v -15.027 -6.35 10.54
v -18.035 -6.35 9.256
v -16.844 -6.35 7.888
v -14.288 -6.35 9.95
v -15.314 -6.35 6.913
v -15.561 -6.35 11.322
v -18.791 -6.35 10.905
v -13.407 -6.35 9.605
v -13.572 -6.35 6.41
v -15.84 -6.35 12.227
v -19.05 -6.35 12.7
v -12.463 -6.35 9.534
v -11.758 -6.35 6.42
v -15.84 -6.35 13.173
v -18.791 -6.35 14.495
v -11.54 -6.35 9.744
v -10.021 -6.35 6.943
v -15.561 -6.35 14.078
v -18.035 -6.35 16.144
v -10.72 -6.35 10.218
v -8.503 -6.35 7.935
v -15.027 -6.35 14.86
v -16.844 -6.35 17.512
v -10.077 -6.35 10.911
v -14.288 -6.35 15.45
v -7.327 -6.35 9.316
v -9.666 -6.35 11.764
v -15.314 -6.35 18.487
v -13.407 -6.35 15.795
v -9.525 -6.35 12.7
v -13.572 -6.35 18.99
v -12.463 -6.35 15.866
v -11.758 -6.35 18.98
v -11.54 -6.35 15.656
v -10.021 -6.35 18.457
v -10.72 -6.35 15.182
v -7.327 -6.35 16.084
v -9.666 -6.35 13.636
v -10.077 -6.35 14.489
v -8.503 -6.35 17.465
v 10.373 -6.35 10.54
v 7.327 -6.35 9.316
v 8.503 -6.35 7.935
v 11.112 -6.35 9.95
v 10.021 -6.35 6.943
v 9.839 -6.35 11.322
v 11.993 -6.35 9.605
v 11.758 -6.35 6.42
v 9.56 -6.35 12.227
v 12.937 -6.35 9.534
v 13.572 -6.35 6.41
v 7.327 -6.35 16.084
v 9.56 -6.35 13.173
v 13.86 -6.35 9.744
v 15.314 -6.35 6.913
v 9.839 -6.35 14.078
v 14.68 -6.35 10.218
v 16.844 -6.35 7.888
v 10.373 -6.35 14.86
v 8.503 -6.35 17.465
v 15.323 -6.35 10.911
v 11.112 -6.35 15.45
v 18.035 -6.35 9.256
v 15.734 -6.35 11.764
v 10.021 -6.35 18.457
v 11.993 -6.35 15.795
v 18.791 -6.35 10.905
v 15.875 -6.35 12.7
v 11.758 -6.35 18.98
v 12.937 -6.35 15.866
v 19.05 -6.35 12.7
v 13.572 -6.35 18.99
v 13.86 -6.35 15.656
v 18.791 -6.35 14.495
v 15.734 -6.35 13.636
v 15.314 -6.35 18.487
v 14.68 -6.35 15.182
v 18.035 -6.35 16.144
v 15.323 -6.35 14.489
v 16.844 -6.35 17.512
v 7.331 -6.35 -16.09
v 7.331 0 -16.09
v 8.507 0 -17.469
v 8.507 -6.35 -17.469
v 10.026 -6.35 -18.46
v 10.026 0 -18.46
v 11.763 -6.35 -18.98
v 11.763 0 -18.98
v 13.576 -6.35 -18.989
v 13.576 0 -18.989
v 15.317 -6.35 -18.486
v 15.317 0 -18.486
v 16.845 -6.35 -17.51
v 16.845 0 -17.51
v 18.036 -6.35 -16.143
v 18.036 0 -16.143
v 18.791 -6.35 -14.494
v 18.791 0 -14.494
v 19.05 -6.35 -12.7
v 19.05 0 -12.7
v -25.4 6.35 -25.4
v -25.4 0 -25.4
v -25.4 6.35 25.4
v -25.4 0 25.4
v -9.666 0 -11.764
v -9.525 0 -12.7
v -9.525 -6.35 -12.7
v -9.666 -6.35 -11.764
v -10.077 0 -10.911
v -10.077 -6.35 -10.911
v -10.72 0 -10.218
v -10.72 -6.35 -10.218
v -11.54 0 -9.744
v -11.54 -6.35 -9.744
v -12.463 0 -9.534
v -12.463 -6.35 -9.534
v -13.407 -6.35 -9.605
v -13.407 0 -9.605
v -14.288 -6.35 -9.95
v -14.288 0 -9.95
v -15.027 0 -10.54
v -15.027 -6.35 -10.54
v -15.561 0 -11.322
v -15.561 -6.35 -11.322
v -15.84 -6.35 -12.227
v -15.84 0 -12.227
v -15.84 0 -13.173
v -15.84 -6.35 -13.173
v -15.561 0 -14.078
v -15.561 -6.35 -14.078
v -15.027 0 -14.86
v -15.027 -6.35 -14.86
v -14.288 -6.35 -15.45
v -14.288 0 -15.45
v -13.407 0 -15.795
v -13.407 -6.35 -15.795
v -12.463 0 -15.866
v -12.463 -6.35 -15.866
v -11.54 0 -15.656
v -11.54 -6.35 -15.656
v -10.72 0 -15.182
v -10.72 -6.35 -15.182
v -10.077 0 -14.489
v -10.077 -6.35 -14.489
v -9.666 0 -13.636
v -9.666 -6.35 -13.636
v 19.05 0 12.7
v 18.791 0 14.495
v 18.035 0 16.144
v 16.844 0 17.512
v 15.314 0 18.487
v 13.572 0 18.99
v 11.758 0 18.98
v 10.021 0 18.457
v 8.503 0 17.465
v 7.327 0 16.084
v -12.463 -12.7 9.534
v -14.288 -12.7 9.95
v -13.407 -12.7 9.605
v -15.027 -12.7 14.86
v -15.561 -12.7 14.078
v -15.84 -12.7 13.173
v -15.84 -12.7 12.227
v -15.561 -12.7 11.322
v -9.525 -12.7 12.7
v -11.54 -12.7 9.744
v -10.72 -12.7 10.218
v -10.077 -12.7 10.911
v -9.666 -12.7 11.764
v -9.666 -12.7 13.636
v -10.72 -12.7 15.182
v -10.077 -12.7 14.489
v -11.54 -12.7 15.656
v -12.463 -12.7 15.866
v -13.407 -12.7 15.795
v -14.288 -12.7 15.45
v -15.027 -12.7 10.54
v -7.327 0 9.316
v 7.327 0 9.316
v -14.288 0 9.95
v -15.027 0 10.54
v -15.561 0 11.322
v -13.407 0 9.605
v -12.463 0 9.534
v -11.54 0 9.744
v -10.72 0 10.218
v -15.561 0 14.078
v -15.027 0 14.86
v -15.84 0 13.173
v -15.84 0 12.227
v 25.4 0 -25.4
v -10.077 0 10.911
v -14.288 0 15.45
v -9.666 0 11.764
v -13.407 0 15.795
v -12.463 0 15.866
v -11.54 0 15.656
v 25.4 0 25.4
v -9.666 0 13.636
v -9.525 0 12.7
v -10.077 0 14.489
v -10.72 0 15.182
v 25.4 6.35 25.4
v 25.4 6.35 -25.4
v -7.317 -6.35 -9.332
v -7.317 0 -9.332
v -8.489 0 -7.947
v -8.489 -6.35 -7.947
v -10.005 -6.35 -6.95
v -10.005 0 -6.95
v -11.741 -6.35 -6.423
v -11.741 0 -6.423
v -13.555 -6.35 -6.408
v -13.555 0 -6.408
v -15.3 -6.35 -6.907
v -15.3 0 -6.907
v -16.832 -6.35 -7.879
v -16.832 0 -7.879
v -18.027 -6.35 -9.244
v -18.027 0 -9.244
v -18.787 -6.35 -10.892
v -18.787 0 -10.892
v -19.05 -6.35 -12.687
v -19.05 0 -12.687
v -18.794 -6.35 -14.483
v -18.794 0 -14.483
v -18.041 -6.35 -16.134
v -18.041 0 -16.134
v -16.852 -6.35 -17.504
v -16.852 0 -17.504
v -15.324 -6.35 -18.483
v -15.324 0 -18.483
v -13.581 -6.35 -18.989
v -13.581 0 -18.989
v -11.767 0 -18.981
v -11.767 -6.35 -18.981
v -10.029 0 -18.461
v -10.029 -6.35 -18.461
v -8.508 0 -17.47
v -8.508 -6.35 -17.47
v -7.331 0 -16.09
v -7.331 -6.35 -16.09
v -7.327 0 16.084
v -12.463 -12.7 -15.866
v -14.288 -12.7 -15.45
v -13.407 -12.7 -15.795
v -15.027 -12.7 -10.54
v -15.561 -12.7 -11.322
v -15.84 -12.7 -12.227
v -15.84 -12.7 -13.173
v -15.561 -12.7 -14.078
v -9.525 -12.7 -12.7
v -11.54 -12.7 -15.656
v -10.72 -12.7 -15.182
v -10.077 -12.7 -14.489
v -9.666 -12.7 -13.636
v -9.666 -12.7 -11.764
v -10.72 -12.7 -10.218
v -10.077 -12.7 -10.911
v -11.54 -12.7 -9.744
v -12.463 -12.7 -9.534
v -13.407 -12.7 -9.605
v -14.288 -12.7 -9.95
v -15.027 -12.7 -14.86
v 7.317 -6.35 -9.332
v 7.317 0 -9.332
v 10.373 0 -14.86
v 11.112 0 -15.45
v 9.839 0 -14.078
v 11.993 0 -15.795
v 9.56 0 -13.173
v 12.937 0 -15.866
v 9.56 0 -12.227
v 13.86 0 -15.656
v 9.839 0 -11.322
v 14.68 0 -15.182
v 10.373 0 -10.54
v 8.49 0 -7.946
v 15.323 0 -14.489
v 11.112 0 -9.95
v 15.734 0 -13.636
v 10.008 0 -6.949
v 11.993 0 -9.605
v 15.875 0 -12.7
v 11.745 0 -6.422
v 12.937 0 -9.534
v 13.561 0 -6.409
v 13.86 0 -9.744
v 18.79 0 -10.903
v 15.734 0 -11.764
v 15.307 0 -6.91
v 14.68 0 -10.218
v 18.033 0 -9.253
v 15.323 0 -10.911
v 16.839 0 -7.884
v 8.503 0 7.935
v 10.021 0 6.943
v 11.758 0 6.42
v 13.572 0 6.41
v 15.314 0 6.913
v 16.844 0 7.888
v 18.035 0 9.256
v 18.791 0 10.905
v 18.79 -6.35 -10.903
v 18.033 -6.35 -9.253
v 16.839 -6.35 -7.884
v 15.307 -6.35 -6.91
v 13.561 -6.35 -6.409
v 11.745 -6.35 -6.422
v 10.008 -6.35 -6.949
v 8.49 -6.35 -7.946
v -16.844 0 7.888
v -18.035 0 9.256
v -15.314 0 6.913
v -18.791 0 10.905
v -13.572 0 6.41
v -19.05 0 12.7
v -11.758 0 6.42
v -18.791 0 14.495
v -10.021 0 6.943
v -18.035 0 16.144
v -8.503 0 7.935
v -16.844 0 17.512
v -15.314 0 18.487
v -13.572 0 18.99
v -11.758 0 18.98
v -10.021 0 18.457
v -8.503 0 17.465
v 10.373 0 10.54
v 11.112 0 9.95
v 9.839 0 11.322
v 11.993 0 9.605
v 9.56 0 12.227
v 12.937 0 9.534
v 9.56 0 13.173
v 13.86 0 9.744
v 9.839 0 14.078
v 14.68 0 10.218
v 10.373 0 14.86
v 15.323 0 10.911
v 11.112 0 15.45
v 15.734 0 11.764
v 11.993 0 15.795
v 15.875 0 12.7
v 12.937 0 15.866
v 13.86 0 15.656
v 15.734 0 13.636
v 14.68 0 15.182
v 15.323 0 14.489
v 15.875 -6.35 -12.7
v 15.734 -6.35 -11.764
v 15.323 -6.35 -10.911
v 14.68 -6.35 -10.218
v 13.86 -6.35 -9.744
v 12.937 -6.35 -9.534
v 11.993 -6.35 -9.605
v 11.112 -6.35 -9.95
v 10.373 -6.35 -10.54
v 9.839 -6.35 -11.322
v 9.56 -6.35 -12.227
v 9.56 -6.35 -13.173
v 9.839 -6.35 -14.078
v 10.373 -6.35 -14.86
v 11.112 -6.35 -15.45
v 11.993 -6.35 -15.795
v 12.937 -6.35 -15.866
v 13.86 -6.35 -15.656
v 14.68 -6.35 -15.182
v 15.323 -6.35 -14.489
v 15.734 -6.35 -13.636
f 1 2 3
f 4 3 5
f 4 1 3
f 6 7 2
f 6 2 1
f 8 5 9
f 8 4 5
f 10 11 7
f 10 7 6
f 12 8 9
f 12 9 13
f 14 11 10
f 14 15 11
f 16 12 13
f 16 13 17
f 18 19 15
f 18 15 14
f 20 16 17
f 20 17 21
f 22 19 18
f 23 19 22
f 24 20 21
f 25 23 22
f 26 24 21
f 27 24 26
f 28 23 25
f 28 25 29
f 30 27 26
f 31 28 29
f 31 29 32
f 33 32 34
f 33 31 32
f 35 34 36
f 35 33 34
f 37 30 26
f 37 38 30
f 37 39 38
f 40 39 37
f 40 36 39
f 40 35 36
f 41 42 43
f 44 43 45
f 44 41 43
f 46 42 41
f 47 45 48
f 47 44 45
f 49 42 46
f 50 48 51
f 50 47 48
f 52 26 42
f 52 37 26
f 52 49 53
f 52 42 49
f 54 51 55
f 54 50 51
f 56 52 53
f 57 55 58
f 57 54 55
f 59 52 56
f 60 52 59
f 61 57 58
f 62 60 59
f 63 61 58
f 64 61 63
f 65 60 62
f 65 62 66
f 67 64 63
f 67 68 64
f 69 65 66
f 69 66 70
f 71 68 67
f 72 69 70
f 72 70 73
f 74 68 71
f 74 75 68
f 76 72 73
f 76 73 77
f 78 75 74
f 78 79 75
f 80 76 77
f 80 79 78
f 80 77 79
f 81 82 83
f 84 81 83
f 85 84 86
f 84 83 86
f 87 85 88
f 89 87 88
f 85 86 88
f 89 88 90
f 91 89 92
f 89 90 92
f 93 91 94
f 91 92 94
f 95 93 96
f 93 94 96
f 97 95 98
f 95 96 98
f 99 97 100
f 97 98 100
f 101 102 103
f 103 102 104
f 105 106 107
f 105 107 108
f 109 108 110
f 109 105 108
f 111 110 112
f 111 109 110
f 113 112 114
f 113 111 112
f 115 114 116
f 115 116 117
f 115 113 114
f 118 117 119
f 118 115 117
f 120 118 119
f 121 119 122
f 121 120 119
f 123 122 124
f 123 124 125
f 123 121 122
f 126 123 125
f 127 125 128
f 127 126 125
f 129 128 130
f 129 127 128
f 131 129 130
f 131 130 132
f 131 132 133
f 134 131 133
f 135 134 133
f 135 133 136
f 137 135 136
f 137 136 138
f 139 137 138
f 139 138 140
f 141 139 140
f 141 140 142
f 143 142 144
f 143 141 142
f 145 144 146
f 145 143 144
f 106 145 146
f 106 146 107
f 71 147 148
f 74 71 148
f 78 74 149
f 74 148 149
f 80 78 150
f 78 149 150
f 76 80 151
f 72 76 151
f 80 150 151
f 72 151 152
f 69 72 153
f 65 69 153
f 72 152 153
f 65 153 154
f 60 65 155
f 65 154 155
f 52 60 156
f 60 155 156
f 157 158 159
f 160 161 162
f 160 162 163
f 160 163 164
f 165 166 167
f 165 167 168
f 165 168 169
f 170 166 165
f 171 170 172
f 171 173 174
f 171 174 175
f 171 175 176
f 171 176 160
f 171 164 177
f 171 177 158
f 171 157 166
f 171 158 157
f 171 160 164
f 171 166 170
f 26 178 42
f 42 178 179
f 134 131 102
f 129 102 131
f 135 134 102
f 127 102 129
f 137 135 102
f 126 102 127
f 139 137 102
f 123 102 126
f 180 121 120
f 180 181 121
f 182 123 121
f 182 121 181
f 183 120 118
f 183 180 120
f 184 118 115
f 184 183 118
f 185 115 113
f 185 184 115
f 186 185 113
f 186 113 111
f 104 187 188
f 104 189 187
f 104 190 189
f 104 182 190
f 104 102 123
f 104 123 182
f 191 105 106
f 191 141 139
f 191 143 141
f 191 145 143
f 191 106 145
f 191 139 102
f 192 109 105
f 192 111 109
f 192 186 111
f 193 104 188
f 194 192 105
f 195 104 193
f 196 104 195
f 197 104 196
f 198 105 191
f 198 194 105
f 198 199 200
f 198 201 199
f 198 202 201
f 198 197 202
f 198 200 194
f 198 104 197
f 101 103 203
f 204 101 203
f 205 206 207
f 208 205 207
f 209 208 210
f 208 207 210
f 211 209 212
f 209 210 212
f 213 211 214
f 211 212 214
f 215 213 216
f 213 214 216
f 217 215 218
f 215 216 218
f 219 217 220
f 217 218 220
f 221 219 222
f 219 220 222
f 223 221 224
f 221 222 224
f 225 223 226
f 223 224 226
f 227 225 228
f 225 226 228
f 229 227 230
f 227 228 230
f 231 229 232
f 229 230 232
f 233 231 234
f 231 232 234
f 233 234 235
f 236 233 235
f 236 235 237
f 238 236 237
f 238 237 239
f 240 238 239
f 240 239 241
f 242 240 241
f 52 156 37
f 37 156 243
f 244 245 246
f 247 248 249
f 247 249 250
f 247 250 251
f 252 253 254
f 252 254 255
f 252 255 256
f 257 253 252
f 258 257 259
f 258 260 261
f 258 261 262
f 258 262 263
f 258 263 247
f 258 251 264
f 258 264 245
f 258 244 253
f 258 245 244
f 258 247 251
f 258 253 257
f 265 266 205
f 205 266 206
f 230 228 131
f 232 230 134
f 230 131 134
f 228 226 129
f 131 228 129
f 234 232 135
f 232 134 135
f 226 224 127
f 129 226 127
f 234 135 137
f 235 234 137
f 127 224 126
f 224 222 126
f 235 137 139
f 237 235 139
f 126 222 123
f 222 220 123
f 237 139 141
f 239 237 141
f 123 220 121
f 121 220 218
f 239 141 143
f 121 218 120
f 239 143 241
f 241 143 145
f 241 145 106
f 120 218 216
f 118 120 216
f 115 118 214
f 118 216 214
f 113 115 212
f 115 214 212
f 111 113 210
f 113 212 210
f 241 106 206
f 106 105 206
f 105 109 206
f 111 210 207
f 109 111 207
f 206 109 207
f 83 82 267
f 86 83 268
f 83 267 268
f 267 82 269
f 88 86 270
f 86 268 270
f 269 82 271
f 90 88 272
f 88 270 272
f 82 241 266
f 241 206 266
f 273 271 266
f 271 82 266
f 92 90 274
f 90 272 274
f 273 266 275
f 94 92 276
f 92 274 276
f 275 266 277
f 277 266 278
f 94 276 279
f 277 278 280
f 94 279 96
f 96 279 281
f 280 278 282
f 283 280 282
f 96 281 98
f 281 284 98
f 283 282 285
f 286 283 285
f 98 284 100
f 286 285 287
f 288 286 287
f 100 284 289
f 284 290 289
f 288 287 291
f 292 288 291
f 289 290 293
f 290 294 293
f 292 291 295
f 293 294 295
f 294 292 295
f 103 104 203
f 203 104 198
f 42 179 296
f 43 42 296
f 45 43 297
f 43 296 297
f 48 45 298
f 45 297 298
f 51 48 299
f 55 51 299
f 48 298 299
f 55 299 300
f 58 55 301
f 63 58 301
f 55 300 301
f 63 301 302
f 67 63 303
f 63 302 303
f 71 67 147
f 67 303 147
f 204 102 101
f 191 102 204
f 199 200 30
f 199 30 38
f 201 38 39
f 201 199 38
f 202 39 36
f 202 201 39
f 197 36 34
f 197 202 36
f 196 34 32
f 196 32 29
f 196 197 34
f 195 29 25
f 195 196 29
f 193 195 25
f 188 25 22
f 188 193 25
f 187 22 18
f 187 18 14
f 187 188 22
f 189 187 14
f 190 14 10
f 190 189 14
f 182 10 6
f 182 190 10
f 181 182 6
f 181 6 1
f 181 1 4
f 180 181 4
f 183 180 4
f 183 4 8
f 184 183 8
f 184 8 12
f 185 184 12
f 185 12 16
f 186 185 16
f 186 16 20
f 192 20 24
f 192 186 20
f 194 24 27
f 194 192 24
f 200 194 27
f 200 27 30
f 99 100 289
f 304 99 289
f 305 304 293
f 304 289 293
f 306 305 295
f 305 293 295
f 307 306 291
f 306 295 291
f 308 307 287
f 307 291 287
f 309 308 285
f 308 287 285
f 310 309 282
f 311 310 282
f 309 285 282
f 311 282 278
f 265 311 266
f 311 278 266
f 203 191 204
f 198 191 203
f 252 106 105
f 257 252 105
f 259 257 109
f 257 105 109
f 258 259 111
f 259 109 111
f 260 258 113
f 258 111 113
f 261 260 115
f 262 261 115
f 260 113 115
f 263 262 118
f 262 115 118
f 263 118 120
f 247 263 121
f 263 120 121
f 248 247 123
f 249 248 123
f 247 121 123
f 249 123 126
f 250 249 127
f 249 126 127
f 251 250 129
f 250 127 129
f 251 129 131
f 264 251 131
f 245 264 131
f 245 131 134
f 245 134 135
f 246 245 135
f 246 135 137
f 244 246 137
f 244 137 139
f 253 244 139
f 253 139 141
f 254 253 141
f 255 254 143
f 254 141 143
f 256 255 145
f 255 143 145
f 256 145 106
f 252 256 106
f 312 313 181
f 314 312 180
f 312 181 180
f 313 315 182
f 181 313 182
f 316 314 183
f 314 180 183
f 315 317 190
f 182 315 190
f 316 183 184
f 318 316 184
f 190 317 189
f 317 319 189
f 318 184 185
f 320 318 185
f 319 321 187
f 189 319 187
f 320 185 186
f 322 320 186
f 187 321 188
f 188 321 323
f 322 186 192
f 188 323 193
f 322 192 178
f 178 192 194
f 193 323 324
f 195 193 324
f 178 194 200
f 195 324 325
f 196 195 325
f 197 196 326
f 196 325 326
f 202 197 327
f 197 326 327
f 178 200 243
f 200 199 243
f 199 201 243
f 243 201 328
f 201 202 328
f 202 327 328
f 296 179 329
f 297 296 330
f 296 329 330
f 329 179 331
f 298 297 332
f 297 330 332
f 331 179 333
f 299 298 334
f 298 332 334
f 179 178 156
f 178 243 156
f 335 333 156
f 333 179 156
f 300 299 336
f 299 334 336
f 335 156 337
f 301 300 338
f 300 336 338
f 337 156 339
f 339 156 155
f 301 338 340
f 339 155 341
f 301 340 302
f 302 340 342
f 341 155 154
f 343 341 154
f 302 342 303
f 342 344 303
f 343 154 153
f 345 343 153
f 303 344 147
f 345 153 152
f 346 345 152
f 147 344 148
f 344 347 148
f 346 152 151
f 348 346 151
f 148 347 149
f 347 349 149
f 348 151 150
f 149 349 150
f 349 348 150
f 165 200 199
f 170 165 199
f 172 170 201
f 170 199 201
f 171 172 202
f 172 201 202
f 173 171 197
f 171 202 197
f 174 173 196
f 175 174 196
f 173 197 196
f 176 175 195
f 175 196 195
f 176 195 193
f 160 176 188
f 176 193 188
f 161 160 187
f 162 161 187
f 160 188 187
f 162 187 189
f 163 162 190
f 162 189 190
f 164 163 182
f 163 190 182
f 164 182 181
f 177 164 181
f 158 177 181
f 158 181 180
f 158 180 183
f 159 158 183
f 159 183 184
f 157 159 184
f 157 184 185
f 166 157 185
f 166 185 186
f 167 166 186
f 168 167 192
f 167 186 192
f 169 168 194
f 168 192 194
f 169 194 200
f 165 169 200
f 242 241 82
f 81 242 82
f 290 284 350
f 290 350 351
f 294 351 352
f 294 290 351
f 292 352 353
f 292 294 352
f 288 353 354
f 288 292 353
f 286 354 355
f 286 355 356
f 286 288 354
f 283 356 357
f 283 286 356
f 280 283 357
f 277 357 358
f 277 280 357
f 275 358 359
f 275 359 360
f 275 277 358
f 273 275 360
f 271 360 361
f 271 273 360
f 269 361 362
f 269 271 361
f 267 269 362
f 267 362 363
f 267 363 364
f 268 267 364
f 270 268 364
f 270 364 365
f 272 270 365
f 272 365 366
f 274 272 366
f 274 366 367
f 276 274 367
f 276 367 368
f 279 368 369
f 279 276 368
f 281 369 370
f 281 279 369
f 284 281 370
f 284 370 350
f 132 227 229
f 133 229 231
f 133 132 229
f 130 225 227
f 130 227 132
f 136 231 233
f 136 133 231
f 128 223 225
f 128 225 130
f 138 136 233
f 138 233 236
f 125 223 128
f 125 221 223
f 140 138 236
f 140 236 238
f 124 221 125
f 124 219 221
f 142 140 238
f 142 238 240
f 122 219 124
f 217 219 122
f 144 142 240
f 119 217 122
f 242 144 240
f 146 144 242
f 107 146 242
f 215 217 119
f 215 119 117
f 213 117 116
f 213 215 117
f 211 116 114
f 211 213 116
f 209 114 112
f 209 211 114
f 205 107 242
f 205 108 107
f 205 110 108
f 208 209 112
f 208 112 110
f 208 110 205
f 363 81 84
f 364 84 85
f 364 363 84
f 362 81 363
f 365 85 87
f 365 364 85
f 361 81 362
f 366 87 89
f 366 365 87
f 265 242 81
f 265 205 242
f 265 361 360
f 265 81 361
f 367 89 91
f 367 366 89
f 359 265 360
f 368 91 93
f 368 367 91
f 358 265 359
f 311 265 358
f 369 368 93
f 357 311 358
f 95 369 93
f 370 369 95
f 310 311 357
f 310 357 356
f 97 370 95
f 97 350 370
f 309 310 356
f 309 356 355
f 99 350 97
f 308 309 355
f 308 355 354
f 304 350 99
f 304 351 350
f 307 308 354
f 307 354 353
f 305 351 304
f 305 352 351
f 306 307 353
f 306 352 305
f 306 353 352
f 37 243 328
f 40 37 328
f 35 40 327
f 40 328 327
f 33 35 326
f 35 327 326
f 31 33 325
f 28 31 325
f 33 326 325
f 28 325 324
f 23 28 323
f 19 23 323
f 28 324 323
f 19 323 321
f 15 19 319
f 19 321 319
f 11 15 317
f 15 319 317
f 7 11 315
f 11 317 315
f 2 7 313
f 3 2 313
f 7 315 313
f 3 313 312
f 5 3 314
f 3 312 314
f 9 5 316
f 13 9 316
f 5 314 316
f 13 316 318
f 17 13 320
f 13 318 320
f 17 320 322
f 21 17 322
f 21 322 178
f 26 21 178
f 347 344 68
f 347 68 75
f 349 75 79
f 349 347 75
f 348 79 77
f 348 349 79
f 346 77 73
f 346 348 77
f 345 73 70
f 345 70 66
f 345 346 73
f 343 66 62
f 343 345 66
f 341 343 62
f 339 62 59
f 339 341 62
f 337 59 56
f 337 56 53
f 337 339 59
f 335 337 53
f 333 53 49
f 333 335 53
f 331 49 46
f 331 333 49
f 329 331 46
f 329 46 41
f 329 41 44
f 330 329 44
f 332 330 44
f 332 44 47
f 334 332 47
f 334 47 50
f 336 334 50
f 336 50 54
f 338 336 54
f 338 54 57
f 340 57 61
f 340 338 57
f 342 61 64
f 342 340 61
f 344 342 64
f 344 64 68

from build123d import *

# Parameters (mm, degrees)
F0_W     = 50.8
F0_H     = 50.8
F0_R     = 3.175
F1_DEPTH = 6.35
F2_DEPTH = 12.7
F3_R     = 3.175
F4_DEPTH = 6.35


with BuildPart() as f1:
    # F0 (on Front) → F1 (new body)
    with BuildSketch(Plane.XZ):
        Rectangle(F0_W, F0_H)
        with Locations((-12.7, -12.7)):
            Circle(F0_R, mode=Mode.SUBTRACT)
        with Locations((-12.7, 12.7)):
            Circle(F0_R, mode=Mode.SUBTRACT)
        with Locations((-12.7, 12.7)):
            Circle(F0_R)
        with Locations((-12.7, -12.7)):
            Circle(F0_R)
    extrude(amount=-F1_DEPTH)

    # F0 (on Front) → F2 (join)
    with BuildSketch(Plane.XZ):
        with Locations((-12.7, -12.7)):
            Circle(F0_R)
        with Locations((-12.7, 12.7)):
            Circle(F0_R)
    extrude(amount=F2_DEPTH)


with BuildPart() as f4:
    # F3 (on face) → F4 (new body)
    with BuildSketch(Plane.XZ):
        with BuildLine():
            ThreePointArc((-7.326959, 9.315783), (-6.599127, 10.938795), (-6.35, 12.7))
            ThreePointArc((-6.35, 12.7), (-6.599127, 14.461205), (-7.326959, 16.084217))
            ThreePointArc((-7.326959, 16.084217), (-19.05, 12.7), (-7.326959, 9.315783))
        make_face()
        with Locations((-12.7, 12.7)):
            Circle(F3_R, mode=Mode.SUBTRACT)
        with BuildLine():
            ThreePointArc((-7.326959, 16.084217), (-6.599127, 14.461205), (-6.35, 12.7))
            ThreePointArc((-6.35, 12.7), (-6.599127, 10.938795), (-7.326959, 9.315783))
            Line((-7.326959, 9.315783), (7.326959, 9.315783))
            ThreePointArc((7.326959, 9.315783), (6.35, 12.7), (7.326959, 16.084217))
            Line((7.326959, 16.084217), (-7.326959, 16.084217))
        make_face()
        with BuildLine():
            ThreePointArc((19.05, 12.7), (14.461205, 18.800873), (7.326959, 16.084217))
            ThreePointArc((7.326959, 16.084217), (6.35, 12.7), (7.326959, 9.315783))
            ThreePointArc((7.326959, 9.315783), (14.461205, 6.599127), (19.05, 12.7))
        make_face()
        with Locations((12.7, 12.7)):
            Circle(F3_R, mode=Mode.SUBTRACT)
        with BuildLine():
            ThreePointArc((-7.330537, -16.089892), (-6.600058, -14.464427), (-6.35, -12.7))
            ThreePointArc((-6.35, -12.7), (-6.596454, -10.948078), (-7.316686, -9.332147))
            ThreePointArc((-7.316686, -9.332147), (-19.049987, -12.686985), (-7.330537, -16.089892))
        make_face()
        with Locations((-12.7, -12.7)):
            Circle(F3_R, mode=Mode.SUBTRACT)
        with BuildLine():
            ThreePointArc((-7.316686, -9.332147), (-6.596454, -10.948078), (-6.35, -12.7))
            ThreePointArc((-6.35, -12.7), (-6.600058, -14.464427), (-7.330537, -16.089892))
            Line((-7.330537, -16.089892), (7.330537, -16.089892))
            ThreePointArc((7.330537, -16.089892), (6.350013, -12.713015), (7.316686, -9.332147))
            Line((7.316686, -9.332147), (-7.316686, -9.332147))
        make_face()
        with BuildLine():
            ThreePointArc((19.05, -12.7), (14.451922, -6.596454), (7.316686, -9.332147))
            ThreePointArc((7.316686, -9.332147), (6.350013, -12.713015), (7.330537, -16.089892))
            ThreePointArc((7.330537, -16.089892), (14.464427, -18.799942), (19.05, -12.7))
        make_face()
        with Locations((12.7, -12.7)):
            Circle(F3_R, mode=Mode.SUBTRACT)
    extrude(amount=F4_DEPTH)


solid = Compound([f1.part, f4.part])
